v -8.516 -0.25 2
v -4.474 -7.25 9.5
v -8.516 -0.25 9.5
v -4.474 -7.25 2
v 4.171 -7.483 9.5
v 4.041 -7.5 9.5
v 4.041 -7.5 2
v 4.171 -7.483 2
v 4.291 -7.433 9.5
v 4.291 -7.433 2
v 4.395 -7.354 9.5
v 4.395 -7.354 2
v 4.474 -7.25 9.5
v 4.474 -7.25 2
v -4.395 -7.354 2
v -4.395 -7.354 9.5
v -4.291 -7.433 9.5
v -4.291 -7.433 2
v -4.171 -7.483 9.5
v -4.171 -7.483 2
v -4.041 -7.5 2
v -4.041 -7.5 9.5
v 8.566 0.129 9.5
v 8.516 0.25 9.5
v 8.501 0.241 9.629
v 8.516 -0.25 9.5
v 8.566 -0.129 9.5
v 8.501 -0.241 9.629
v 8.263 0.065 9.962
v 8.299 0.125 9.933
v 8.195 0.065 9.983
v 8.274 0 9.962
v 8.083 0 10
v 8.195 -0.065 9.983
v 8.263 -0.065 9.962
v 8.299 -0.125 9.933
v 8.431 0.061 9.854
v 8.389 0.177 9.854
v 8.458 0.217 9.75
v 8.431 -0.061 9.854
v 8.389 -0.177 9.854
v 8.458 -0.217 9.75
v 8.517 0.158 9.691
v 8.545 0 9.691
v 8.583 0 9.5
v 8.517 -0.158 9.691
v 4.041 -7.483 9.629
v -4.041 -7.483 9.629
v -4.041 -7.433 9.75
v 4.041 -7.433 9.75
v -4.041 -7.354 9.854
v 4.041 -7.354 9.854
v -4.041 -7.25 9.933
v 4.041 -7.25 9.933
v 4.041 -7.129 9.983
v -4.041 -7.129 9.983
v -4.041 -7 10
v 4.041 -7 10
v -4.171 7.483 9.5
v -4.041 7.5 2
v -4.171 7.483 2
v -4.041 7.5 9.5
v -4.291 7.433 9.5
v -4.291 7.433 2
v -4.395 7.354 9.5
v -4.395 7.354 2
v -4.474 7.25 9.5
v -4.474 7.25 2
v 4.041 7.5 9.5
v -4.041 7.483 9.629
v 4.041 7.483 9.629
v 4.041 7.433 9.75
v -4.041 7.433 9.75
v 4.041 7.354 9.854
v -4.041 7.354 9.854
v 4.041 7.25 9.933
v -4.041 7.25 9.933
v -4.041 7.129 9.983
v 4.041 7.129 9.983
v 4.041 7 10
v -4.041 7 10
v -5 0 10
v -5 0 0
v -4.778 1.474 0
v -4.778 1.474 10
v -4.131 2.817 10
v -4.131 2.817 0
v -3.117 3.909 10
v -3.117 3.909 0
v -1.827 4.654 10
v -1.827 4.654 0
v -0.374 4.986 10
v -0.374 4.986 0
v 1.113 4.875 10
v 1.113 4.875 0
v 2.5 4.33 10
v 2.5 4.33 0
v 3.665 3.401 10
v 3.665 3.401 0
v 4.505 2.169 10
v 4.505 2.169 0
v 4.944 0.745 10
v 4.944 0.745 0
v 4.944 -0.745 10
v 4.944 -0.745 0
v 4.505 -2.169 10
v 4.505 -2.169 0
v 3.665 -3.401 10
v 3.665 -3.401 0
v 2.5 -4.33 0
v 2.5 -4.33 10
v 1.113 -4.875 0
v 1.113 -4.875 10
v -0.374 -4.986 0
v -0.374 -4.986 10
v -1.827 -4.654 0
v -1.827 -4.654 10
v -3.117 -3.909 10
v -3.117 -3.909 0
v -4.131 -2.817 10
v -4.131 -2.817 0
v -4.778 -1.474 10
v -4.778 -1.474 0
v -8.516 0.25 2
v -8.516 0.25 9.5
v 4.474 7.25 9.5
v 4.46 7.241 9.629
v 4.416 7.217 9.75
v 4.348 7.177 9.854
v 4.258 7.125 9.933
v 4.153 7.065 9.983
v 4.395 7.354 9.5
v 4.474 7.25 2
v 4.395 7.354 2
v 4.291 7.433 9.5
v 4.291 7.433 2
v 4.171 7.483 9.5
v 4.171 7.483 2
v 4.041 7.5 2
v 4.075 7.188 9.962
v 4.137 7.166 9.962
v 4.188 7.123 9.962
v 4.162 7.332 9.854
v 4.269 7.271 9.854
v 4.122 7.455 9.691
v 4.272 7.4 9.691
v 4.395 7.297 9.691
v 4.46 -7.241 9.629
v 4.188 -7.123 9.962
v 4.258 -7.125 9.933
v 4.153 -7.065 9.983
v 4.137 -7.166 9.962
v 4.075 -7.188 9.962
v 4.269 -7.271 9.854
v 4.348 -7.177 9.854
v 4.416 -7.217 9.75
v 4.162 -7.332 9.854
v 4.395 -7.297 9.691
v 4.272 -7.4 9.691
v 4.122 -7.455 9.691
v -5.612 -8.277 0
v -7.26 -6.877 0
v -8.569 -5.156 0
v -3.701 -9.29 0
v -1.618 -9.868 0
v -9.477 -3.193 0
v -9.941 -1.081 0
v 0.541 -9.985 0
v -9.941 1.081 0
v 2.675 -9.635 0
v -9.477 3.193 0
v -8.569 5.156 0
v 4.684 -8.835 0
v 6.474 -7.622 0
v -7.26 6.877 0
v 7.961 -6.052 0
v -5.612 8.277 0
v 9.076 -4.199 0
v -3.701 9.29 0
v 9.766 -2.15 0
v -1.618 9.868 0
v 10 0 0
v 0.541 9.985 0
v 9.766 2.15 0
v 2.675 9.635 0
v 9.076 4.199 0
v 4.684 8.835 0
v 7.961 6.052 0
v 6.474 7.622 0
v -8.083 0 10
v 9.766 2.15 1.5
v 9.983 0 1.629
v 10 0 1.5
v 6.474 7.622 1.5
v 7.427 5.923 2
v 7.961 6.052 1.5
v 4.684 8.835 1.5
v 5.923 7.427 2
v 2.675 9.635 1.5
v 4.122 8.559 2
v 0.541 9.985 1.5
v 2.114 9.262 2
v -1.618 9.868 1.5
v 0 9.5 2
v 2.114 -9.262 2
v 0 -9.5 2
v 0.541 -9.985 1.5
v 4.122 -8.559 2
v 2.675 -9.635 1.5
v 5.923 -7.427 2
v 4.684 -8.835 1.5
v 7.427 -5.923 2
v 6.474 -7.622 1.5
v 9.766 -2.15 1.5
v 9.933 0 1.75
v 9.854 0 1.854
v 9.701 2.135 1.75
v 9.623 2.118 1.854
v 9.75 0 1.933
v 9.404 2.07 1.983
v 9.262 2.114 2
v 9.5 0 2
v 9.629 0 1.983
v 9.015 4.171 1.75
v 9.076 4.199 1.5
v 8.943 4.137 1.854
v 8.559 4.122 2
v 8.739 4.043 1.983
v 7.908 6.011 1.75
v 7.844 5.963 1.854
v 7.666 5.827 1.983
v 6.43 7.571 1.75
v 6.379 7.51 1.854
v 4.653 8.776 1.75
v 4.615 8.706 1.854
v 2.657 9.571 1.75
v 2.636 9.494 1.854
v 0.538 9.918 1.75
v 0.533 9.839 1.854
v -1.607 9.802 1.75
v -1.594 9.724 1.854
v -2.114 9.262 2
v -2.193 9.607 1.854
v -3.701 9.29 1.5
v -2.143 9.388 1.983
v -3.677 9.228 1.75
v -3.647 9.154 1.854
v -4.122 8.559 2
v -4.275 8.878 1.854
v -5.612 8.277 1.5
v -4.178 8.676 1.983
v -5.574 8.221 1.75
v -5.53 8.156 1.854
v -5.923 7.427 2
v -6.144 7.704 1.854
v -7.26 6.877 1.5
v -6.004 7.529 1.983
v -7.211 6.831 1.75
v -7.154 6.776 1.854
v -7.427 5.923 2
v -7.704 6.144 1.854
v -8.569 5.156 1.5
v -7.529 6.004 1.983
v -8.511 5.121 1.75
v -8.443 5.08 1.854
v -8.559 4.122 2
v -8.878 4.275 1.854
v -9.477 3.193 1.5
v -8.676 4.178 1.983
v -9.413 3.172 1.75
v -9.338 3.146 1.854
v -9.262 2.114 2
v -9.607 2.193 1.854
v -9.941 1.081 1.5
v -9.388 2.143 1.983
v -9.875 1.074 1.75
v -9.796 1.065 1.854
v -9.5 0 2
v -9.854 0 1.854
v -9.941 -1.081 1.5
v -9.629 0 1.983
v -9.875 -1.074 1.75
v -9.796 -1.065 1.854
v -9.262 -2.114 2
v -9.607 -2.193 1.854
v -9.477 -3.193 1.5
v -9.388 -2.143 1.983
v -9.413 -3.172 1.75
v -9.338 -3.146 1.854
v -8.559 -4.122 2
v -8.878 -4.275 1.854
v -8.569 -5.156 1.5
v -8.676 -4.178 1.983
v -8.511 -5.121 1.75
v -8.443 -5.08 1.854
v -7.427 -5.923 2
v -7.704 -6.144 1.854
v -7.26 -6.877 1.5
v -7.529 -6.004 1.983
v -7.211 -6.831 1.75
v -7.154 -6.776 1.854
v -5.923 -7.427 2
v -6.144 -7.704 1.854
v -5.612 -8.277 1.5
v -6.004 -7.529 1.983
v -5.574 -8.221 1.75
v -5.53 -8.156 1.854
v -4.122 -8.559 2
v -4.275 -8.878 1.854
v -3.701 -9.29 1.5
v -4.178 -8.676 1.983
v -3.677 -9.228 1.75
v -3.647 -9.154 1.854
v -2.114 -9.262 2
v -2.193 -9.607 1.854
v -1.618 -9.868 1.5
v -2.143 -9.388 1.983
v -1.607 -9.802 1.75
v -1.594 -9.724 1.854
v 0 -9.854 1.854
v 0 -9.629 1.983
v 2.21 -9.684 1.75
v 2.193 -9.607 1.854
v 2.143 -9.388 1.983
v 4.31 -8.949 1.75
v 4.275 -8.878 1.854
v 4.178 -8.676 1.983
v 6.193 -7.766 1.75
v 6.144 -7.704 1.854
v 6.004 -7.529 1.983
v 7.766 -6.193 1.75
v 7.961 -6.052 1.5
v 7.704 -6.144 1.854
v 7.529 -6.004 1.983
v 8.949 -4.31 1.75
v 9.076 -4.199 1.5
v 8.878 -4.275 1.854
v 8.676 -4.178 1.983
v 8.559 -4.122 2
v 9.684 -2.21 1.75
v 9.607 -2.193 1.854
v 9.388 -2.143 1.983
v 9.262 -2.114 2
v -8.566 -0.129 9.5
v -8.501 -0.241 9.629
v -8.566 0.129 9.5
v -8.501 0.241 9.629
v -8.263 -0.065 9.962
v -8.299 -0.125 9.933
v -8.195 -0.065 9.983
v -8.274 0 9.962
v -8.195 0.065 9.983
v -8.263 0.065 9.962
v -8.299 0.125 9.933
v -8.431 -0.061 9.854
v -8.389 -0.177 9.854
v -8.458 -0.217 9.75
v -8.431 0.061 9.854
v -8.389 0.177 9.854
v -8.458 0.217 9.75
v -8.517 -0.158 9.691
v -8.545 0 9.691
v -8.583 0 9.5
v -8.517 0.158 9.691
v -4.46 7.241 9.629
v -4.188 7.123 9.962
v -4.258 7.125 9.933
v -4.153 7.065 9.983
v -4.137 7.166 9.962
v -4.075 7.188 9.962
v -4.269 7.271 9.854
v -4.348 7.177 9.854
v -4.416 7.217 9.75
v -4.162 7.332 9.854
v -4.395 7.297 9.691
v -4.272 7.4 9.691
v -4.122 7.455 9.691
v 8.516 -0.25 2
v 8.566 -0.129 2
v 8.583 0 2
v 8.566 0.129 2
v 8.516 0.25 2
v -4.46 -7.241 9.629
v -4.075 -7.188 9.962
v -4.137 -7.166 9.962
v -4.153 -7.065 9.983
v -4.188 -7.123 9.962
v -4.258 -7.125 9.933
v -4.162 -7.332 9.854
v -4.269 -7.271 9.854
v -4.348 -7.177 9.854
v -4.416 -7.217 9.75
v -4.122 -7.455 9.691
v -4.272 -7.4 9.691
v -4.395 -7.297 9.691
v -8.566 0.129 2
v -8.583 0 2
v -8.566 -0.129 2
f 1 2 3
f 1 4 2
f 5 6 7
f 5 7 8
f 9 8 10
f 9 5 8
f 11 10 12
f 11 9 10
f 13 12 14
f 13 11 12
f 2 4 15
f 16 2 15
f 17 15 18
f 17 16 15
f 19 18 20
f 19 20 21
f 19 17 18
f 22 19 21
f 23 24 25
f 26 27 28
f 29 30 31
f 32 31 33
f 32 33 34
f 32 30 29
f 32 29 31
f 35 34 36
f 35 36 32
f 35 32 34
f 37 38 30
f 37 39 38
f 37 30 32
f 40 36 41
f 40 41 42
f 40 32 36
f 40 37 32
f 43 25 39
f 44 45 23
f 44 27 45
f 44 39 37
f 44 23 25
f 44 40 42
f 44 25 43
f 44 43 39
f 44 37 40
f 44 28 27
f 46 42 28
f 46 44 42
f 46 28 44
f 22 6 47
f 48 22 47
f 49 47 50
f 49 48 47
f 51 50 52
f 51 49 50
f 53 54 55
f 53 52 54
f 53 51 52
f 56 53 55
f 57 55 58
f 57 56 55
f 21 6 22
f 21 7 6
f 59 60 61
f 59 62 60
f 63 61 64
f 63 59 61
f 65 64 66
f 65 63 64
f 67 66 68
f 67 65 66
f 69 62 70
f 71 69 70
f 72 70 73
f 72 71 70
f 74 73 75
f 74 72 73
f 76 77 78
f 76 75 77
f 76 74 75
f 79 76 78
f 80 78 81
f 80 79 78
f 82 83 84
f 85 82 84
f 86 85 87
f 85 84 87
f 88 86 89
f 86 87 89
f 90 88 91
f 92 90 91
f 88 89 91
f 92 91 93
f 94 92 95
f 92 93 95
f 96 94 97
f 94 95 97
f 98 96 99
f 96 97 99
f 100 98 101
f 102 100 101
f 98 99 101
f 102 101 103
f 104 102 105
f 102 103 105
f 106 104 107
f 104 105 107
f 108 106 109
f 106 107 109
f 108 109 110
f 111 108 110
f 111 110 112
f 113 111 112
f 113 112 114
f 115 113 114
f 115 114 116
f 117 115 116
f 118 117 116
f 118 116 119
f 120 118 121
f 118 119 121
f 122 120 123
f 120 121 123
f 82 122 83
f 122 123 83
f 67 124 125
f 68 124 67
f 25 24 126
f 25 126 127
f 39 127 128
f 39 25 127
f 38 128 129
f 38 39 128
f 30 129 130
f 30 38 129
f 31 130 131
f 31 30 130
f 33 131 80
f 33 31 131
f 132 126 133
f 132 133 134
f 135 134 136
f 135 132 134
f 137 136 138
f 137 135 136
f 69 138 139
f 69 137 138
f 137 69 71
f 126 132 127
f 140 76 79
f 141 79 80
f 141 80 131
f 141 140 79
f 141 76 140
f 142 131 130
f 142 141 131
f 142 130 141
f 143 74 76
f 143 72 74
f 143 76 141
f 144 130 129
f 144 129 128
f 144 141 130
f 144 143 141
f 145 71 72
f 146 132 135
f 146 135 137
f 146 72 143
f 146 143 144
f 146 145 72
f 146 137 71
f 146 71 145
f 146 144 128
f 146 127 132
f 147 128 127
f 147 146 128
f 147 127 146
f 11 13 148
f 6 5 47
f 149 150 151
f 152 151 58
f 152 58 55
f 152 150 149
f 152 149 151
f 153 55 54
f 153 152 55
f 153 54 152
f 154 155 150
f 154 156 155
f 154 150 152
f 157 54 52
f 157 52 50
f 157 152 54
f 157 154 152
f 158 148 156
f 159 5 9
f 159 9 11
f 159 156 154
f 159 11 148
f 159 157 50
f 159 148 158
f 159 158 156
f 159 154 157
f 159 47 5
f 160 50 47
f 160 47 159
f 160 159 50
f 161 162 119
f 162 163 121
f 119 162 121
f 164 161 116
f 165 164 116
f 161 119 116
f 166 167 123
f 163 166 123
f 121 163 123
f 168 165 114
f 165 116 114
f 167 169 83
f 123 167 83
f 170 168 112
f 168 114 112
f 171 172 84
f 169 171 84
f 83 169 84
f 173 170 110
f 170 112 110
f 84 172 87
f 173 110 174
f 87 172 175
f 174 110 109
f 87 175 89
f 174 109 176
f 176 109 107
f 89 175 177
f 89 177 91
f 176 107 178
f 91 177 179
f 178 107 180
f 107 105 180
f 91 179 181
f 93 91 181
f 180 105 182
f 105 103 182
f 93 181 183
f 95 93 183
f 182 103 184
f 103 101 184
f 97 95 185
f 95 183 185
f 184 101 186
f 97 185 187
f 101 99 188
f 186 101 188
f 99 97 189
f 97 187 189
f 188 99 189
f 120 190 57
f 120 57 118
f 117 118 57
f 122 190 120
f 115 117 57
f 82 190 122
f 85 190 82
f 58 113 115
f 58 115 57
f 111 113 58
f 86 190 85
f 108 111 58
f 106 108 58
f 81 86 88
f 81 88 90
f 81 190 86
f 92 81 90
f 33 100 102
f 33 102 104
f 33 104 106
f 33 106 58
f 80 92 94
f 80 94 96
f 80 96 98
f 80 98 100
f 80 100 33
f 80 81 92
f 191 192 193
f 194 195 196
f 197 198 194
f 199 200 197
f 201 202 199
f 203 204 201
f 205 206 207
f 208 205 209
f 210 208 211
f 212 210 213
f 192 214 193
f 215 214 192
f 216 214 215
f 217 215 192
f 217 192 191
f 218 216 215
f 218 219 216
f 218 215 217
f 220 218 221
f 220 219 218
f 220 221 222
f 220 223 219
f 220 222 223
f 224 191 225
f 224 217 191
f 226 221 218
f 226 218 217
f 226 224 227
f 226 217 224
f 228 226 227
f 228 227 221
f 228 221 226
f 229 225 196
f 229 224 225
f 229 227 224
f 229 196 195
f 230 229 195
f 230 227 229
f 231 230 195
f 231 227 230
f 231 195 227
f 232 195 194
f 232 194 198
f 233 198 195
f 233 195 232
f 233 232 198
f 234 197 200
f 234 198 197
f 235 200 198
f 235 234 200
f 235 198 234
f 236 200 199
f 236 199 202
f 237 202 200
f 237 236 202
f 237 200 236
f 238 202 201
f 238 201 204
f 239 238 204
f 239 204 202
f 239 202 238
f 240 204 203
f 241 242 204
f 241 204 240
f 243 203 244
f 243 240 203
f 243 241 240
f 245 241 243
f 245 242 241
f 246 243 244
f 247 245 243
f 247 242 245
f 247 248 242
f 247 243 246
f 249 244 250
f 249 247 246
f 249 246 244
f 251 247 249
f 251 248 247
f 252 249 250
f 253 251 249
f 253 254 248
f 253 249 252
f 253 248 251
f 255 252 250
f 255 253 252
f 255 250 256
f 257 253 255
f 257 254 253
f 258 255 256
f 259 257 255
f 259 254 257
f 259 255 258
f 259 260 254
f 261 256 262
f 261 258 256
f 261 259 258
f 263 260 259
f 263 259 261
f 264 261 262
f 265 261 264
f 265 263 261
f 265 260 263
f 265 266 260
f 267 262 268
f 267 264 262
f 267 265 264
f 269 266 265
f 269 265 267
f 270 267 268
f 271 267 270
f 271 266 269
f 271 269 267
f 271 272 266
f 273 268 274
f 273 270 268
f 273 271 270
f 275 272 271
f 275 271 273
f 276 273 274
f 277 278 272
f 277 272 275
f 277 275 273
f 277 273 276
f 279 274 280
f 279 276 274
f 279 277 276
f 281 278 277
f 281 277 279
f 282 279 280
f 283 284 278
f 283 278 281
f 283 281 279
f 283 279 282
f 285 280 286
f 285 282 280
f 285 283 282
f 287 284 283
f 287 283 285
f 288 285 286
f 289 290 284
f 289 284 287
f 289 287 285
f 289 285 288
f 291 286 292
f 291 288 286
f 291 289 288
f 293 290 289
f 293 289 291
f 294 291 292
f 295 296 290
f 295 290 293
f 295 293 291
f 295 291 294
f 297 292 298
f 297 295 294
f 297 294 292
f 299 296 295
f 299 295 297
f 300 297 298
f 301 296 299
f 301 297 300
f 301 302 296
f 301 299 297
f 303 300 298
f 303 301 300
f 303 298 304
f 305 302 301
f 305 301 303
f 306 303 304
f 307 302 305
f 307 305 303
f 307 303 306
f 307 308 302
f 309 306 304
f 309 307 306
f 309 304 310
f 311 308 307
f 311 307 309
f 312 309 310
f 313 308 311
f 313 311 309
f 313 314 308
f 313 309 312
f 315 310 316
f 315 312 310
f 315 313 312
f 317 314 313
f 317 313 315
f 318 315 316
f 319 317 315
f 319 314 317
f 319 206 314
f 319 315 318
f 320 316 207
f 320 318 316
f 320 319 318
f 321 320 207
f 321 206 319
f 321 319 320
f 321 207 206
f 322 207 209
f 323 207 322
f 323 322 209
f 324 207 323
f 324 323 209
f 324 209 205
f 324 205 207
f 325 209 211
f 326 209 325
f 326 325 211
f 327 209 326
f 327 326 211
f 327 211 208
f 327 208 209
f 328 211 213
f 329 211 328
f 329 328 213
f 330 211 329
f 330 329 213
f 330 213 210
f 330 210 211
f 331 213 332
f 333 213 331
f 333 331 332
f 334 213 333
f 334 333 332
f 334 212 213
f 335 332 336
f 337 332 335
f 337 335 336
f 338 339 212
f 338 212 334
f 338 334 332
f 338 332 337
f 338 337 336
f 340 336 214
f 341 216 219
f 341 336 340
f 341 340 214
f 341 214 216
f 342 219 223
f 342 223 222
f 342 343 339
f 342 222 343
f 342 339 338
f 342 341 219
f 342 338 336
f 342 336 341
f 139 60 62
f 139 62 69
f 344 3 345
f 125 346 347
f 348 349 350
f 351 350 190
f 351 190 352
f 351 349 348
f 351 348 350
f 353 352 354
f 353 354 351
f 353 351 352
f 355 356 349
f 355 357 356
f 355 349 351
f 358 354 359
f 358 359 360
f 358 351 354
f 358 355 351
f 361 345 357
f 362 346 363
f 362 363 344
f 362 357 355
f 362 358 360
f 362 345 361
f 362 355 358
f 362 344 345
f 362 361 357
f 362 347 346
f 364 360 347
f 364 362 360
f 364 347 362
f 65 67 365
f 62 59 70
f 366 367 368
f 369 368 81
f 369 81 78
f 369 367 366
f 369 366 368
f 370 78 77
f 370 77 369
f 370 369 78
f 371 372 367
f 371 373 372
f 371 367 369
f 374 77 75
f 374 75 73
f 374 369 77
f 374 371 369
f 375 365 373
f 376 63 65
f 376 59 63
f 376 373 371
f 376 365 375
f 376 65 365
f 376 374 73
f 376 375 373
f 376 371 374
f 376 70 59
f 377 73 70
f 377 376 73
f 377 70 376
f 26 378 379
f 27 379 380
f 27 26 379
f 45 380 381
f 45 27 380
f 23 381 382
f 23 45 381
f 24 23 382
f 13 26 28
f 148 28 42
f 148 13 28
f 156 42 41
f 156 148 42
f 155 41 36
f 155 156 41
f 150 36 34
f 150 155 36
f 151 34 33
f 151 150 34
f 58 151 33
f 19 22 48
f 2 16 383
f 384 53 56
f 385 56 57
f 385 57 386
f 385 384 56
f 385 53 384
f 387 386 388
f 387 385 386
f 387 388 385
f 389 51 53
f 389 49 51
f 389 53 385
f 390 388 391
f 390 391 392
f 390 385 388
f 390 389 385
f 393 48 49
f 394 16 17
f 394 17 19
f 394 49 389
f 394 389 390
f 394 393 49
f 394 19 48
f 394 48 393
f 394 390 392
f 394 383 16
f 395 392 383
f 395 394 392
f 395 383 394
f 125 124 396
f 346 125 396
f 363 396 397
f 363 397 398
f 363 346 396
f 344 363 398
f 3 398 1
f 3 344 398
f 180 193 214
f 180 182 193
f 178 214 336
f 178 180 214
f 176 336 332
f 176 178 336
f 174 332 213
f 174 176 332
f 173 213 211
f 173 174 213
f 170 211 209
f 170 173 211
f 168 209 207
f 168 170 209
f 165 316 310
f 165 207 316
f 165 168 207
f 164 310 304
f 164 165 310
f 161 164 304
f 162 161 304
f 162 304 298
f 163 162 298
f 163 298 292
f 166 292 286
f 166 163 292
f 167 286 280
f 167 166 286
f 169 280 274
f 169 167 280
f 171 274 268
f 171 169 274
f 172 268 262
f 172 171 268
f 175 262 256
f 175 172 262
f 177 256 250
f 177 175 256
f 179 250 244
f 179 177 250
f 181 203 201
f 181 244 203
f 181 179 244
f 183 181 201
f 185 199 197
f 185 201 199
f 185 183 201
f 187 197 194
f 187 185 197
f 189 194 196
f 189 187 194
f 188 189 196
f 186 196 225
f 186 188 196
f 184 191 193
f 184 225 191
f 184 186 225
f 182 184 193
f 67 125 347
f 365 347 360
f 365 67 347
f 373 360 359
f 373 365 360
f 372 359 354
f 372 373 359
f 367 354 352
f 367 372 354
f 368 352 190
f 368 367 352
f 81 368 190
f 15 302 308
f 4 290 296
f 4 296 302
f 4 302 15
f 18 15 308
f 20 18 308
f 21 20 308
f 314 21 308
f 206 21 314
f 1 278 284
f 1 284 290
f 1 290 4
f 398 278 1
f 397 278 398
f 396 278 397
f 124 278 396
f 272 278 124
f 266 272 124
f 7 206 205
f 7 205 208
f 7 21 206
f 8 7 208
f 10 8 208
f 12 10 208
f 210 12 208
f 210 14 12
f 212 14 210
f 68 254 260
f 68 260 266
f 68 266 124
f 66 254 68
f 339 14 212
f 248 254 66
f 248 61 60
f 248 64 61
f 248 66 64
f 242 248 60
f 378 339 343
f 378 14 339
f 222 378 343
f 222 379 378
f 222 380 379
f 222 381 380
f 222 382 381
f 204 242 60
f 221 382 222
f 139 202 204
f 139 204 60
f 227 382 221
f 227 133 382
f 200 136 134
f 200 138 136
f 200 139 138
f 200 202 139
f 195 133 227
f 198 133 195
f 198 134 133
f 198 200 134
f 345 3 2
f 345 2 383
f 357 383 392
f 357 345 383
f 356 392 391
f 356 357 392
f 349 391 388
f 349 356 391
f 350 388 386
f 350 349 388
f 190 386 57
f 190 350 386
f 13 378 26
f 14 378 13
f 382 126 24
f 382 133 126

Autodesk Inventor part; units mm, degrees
ref_plane "YZ Plane" through (0, 0, 0) normal (1, 0, 0) x (0, 1, 0)
ref_plane "XZ Plane" through (0, 0, 0) normal (0, 1, 0) x (-1, 0, 0)
ref_plane "XY Plane" through (0, 0, 0) normal (0, 0, 1) x (1, 0, 0)
sketch "草图1" plane through (0, 0, 0) normal (0, 0, 1) x (1, 0, 0)
  circle A0 centre (0, 0) radius 10
  dimension "d0" = 20
extrude "拉伸1" add sketch "草图1" along normal blind 2
sketch "草图2" plane through (0, 0, 2) normal (0, 0, 1) x (1, 0, 0)
  line L0 (4.3301, -7.5) -> (-4.3301, -7.5)
  line L1 (-4.3301, -7.5) -> (-8.6603, 0)
  line L2 (-8.6603, 0) -> (-4.3301, 7.5)
  line L3 (-4.3301, 7.5) -> (4.3301, 7.5)
  line L4 (4.3301, 7.5) -> (8.6603, 0)
  line L5 (8.6603, 0) -> (4.3301, -7.5)
  line L6 (0, 0) -> (0, 2.6407)
  point P0 (0, 7.5)
  dimension "d3" = 2.6407
  dimension "d4" = 15
extrude "拉伸2" add sketch "草图2" along normal blind 8
fillet "圆角1" radius 0.5 13 edges at (-10, 0, 2) (0, 7.5, 10) (4.3301, 7.5, 6) (-4.3301, 7.5, 6) (-6.4952, 3.75, 10) (6.4952, 3.75, 10) (-6.4952, -3.75, 10) (0, -7.5, 10) (6.4952, -3.75, 10) (8.6603, 0, 6) (4.3301, -7.5, 6) (-4.3301, -7.5, 6) (-8.6603, 0, 6)
sketch "草图3" plane through (0, 0, 0) normal (0, 0, -1) x (-1, 0, 0)
  circle A0 centre (0, 0) radius 5
  dimension "d8" = 10
extrude "拉伸3" cut sketch "草图3" against normal through all
thread "螺纹1" size "M10x1.5" class "6H" standard "ANSI Metric M Profile" full length
properties part number "托带轮固定螺丝"
